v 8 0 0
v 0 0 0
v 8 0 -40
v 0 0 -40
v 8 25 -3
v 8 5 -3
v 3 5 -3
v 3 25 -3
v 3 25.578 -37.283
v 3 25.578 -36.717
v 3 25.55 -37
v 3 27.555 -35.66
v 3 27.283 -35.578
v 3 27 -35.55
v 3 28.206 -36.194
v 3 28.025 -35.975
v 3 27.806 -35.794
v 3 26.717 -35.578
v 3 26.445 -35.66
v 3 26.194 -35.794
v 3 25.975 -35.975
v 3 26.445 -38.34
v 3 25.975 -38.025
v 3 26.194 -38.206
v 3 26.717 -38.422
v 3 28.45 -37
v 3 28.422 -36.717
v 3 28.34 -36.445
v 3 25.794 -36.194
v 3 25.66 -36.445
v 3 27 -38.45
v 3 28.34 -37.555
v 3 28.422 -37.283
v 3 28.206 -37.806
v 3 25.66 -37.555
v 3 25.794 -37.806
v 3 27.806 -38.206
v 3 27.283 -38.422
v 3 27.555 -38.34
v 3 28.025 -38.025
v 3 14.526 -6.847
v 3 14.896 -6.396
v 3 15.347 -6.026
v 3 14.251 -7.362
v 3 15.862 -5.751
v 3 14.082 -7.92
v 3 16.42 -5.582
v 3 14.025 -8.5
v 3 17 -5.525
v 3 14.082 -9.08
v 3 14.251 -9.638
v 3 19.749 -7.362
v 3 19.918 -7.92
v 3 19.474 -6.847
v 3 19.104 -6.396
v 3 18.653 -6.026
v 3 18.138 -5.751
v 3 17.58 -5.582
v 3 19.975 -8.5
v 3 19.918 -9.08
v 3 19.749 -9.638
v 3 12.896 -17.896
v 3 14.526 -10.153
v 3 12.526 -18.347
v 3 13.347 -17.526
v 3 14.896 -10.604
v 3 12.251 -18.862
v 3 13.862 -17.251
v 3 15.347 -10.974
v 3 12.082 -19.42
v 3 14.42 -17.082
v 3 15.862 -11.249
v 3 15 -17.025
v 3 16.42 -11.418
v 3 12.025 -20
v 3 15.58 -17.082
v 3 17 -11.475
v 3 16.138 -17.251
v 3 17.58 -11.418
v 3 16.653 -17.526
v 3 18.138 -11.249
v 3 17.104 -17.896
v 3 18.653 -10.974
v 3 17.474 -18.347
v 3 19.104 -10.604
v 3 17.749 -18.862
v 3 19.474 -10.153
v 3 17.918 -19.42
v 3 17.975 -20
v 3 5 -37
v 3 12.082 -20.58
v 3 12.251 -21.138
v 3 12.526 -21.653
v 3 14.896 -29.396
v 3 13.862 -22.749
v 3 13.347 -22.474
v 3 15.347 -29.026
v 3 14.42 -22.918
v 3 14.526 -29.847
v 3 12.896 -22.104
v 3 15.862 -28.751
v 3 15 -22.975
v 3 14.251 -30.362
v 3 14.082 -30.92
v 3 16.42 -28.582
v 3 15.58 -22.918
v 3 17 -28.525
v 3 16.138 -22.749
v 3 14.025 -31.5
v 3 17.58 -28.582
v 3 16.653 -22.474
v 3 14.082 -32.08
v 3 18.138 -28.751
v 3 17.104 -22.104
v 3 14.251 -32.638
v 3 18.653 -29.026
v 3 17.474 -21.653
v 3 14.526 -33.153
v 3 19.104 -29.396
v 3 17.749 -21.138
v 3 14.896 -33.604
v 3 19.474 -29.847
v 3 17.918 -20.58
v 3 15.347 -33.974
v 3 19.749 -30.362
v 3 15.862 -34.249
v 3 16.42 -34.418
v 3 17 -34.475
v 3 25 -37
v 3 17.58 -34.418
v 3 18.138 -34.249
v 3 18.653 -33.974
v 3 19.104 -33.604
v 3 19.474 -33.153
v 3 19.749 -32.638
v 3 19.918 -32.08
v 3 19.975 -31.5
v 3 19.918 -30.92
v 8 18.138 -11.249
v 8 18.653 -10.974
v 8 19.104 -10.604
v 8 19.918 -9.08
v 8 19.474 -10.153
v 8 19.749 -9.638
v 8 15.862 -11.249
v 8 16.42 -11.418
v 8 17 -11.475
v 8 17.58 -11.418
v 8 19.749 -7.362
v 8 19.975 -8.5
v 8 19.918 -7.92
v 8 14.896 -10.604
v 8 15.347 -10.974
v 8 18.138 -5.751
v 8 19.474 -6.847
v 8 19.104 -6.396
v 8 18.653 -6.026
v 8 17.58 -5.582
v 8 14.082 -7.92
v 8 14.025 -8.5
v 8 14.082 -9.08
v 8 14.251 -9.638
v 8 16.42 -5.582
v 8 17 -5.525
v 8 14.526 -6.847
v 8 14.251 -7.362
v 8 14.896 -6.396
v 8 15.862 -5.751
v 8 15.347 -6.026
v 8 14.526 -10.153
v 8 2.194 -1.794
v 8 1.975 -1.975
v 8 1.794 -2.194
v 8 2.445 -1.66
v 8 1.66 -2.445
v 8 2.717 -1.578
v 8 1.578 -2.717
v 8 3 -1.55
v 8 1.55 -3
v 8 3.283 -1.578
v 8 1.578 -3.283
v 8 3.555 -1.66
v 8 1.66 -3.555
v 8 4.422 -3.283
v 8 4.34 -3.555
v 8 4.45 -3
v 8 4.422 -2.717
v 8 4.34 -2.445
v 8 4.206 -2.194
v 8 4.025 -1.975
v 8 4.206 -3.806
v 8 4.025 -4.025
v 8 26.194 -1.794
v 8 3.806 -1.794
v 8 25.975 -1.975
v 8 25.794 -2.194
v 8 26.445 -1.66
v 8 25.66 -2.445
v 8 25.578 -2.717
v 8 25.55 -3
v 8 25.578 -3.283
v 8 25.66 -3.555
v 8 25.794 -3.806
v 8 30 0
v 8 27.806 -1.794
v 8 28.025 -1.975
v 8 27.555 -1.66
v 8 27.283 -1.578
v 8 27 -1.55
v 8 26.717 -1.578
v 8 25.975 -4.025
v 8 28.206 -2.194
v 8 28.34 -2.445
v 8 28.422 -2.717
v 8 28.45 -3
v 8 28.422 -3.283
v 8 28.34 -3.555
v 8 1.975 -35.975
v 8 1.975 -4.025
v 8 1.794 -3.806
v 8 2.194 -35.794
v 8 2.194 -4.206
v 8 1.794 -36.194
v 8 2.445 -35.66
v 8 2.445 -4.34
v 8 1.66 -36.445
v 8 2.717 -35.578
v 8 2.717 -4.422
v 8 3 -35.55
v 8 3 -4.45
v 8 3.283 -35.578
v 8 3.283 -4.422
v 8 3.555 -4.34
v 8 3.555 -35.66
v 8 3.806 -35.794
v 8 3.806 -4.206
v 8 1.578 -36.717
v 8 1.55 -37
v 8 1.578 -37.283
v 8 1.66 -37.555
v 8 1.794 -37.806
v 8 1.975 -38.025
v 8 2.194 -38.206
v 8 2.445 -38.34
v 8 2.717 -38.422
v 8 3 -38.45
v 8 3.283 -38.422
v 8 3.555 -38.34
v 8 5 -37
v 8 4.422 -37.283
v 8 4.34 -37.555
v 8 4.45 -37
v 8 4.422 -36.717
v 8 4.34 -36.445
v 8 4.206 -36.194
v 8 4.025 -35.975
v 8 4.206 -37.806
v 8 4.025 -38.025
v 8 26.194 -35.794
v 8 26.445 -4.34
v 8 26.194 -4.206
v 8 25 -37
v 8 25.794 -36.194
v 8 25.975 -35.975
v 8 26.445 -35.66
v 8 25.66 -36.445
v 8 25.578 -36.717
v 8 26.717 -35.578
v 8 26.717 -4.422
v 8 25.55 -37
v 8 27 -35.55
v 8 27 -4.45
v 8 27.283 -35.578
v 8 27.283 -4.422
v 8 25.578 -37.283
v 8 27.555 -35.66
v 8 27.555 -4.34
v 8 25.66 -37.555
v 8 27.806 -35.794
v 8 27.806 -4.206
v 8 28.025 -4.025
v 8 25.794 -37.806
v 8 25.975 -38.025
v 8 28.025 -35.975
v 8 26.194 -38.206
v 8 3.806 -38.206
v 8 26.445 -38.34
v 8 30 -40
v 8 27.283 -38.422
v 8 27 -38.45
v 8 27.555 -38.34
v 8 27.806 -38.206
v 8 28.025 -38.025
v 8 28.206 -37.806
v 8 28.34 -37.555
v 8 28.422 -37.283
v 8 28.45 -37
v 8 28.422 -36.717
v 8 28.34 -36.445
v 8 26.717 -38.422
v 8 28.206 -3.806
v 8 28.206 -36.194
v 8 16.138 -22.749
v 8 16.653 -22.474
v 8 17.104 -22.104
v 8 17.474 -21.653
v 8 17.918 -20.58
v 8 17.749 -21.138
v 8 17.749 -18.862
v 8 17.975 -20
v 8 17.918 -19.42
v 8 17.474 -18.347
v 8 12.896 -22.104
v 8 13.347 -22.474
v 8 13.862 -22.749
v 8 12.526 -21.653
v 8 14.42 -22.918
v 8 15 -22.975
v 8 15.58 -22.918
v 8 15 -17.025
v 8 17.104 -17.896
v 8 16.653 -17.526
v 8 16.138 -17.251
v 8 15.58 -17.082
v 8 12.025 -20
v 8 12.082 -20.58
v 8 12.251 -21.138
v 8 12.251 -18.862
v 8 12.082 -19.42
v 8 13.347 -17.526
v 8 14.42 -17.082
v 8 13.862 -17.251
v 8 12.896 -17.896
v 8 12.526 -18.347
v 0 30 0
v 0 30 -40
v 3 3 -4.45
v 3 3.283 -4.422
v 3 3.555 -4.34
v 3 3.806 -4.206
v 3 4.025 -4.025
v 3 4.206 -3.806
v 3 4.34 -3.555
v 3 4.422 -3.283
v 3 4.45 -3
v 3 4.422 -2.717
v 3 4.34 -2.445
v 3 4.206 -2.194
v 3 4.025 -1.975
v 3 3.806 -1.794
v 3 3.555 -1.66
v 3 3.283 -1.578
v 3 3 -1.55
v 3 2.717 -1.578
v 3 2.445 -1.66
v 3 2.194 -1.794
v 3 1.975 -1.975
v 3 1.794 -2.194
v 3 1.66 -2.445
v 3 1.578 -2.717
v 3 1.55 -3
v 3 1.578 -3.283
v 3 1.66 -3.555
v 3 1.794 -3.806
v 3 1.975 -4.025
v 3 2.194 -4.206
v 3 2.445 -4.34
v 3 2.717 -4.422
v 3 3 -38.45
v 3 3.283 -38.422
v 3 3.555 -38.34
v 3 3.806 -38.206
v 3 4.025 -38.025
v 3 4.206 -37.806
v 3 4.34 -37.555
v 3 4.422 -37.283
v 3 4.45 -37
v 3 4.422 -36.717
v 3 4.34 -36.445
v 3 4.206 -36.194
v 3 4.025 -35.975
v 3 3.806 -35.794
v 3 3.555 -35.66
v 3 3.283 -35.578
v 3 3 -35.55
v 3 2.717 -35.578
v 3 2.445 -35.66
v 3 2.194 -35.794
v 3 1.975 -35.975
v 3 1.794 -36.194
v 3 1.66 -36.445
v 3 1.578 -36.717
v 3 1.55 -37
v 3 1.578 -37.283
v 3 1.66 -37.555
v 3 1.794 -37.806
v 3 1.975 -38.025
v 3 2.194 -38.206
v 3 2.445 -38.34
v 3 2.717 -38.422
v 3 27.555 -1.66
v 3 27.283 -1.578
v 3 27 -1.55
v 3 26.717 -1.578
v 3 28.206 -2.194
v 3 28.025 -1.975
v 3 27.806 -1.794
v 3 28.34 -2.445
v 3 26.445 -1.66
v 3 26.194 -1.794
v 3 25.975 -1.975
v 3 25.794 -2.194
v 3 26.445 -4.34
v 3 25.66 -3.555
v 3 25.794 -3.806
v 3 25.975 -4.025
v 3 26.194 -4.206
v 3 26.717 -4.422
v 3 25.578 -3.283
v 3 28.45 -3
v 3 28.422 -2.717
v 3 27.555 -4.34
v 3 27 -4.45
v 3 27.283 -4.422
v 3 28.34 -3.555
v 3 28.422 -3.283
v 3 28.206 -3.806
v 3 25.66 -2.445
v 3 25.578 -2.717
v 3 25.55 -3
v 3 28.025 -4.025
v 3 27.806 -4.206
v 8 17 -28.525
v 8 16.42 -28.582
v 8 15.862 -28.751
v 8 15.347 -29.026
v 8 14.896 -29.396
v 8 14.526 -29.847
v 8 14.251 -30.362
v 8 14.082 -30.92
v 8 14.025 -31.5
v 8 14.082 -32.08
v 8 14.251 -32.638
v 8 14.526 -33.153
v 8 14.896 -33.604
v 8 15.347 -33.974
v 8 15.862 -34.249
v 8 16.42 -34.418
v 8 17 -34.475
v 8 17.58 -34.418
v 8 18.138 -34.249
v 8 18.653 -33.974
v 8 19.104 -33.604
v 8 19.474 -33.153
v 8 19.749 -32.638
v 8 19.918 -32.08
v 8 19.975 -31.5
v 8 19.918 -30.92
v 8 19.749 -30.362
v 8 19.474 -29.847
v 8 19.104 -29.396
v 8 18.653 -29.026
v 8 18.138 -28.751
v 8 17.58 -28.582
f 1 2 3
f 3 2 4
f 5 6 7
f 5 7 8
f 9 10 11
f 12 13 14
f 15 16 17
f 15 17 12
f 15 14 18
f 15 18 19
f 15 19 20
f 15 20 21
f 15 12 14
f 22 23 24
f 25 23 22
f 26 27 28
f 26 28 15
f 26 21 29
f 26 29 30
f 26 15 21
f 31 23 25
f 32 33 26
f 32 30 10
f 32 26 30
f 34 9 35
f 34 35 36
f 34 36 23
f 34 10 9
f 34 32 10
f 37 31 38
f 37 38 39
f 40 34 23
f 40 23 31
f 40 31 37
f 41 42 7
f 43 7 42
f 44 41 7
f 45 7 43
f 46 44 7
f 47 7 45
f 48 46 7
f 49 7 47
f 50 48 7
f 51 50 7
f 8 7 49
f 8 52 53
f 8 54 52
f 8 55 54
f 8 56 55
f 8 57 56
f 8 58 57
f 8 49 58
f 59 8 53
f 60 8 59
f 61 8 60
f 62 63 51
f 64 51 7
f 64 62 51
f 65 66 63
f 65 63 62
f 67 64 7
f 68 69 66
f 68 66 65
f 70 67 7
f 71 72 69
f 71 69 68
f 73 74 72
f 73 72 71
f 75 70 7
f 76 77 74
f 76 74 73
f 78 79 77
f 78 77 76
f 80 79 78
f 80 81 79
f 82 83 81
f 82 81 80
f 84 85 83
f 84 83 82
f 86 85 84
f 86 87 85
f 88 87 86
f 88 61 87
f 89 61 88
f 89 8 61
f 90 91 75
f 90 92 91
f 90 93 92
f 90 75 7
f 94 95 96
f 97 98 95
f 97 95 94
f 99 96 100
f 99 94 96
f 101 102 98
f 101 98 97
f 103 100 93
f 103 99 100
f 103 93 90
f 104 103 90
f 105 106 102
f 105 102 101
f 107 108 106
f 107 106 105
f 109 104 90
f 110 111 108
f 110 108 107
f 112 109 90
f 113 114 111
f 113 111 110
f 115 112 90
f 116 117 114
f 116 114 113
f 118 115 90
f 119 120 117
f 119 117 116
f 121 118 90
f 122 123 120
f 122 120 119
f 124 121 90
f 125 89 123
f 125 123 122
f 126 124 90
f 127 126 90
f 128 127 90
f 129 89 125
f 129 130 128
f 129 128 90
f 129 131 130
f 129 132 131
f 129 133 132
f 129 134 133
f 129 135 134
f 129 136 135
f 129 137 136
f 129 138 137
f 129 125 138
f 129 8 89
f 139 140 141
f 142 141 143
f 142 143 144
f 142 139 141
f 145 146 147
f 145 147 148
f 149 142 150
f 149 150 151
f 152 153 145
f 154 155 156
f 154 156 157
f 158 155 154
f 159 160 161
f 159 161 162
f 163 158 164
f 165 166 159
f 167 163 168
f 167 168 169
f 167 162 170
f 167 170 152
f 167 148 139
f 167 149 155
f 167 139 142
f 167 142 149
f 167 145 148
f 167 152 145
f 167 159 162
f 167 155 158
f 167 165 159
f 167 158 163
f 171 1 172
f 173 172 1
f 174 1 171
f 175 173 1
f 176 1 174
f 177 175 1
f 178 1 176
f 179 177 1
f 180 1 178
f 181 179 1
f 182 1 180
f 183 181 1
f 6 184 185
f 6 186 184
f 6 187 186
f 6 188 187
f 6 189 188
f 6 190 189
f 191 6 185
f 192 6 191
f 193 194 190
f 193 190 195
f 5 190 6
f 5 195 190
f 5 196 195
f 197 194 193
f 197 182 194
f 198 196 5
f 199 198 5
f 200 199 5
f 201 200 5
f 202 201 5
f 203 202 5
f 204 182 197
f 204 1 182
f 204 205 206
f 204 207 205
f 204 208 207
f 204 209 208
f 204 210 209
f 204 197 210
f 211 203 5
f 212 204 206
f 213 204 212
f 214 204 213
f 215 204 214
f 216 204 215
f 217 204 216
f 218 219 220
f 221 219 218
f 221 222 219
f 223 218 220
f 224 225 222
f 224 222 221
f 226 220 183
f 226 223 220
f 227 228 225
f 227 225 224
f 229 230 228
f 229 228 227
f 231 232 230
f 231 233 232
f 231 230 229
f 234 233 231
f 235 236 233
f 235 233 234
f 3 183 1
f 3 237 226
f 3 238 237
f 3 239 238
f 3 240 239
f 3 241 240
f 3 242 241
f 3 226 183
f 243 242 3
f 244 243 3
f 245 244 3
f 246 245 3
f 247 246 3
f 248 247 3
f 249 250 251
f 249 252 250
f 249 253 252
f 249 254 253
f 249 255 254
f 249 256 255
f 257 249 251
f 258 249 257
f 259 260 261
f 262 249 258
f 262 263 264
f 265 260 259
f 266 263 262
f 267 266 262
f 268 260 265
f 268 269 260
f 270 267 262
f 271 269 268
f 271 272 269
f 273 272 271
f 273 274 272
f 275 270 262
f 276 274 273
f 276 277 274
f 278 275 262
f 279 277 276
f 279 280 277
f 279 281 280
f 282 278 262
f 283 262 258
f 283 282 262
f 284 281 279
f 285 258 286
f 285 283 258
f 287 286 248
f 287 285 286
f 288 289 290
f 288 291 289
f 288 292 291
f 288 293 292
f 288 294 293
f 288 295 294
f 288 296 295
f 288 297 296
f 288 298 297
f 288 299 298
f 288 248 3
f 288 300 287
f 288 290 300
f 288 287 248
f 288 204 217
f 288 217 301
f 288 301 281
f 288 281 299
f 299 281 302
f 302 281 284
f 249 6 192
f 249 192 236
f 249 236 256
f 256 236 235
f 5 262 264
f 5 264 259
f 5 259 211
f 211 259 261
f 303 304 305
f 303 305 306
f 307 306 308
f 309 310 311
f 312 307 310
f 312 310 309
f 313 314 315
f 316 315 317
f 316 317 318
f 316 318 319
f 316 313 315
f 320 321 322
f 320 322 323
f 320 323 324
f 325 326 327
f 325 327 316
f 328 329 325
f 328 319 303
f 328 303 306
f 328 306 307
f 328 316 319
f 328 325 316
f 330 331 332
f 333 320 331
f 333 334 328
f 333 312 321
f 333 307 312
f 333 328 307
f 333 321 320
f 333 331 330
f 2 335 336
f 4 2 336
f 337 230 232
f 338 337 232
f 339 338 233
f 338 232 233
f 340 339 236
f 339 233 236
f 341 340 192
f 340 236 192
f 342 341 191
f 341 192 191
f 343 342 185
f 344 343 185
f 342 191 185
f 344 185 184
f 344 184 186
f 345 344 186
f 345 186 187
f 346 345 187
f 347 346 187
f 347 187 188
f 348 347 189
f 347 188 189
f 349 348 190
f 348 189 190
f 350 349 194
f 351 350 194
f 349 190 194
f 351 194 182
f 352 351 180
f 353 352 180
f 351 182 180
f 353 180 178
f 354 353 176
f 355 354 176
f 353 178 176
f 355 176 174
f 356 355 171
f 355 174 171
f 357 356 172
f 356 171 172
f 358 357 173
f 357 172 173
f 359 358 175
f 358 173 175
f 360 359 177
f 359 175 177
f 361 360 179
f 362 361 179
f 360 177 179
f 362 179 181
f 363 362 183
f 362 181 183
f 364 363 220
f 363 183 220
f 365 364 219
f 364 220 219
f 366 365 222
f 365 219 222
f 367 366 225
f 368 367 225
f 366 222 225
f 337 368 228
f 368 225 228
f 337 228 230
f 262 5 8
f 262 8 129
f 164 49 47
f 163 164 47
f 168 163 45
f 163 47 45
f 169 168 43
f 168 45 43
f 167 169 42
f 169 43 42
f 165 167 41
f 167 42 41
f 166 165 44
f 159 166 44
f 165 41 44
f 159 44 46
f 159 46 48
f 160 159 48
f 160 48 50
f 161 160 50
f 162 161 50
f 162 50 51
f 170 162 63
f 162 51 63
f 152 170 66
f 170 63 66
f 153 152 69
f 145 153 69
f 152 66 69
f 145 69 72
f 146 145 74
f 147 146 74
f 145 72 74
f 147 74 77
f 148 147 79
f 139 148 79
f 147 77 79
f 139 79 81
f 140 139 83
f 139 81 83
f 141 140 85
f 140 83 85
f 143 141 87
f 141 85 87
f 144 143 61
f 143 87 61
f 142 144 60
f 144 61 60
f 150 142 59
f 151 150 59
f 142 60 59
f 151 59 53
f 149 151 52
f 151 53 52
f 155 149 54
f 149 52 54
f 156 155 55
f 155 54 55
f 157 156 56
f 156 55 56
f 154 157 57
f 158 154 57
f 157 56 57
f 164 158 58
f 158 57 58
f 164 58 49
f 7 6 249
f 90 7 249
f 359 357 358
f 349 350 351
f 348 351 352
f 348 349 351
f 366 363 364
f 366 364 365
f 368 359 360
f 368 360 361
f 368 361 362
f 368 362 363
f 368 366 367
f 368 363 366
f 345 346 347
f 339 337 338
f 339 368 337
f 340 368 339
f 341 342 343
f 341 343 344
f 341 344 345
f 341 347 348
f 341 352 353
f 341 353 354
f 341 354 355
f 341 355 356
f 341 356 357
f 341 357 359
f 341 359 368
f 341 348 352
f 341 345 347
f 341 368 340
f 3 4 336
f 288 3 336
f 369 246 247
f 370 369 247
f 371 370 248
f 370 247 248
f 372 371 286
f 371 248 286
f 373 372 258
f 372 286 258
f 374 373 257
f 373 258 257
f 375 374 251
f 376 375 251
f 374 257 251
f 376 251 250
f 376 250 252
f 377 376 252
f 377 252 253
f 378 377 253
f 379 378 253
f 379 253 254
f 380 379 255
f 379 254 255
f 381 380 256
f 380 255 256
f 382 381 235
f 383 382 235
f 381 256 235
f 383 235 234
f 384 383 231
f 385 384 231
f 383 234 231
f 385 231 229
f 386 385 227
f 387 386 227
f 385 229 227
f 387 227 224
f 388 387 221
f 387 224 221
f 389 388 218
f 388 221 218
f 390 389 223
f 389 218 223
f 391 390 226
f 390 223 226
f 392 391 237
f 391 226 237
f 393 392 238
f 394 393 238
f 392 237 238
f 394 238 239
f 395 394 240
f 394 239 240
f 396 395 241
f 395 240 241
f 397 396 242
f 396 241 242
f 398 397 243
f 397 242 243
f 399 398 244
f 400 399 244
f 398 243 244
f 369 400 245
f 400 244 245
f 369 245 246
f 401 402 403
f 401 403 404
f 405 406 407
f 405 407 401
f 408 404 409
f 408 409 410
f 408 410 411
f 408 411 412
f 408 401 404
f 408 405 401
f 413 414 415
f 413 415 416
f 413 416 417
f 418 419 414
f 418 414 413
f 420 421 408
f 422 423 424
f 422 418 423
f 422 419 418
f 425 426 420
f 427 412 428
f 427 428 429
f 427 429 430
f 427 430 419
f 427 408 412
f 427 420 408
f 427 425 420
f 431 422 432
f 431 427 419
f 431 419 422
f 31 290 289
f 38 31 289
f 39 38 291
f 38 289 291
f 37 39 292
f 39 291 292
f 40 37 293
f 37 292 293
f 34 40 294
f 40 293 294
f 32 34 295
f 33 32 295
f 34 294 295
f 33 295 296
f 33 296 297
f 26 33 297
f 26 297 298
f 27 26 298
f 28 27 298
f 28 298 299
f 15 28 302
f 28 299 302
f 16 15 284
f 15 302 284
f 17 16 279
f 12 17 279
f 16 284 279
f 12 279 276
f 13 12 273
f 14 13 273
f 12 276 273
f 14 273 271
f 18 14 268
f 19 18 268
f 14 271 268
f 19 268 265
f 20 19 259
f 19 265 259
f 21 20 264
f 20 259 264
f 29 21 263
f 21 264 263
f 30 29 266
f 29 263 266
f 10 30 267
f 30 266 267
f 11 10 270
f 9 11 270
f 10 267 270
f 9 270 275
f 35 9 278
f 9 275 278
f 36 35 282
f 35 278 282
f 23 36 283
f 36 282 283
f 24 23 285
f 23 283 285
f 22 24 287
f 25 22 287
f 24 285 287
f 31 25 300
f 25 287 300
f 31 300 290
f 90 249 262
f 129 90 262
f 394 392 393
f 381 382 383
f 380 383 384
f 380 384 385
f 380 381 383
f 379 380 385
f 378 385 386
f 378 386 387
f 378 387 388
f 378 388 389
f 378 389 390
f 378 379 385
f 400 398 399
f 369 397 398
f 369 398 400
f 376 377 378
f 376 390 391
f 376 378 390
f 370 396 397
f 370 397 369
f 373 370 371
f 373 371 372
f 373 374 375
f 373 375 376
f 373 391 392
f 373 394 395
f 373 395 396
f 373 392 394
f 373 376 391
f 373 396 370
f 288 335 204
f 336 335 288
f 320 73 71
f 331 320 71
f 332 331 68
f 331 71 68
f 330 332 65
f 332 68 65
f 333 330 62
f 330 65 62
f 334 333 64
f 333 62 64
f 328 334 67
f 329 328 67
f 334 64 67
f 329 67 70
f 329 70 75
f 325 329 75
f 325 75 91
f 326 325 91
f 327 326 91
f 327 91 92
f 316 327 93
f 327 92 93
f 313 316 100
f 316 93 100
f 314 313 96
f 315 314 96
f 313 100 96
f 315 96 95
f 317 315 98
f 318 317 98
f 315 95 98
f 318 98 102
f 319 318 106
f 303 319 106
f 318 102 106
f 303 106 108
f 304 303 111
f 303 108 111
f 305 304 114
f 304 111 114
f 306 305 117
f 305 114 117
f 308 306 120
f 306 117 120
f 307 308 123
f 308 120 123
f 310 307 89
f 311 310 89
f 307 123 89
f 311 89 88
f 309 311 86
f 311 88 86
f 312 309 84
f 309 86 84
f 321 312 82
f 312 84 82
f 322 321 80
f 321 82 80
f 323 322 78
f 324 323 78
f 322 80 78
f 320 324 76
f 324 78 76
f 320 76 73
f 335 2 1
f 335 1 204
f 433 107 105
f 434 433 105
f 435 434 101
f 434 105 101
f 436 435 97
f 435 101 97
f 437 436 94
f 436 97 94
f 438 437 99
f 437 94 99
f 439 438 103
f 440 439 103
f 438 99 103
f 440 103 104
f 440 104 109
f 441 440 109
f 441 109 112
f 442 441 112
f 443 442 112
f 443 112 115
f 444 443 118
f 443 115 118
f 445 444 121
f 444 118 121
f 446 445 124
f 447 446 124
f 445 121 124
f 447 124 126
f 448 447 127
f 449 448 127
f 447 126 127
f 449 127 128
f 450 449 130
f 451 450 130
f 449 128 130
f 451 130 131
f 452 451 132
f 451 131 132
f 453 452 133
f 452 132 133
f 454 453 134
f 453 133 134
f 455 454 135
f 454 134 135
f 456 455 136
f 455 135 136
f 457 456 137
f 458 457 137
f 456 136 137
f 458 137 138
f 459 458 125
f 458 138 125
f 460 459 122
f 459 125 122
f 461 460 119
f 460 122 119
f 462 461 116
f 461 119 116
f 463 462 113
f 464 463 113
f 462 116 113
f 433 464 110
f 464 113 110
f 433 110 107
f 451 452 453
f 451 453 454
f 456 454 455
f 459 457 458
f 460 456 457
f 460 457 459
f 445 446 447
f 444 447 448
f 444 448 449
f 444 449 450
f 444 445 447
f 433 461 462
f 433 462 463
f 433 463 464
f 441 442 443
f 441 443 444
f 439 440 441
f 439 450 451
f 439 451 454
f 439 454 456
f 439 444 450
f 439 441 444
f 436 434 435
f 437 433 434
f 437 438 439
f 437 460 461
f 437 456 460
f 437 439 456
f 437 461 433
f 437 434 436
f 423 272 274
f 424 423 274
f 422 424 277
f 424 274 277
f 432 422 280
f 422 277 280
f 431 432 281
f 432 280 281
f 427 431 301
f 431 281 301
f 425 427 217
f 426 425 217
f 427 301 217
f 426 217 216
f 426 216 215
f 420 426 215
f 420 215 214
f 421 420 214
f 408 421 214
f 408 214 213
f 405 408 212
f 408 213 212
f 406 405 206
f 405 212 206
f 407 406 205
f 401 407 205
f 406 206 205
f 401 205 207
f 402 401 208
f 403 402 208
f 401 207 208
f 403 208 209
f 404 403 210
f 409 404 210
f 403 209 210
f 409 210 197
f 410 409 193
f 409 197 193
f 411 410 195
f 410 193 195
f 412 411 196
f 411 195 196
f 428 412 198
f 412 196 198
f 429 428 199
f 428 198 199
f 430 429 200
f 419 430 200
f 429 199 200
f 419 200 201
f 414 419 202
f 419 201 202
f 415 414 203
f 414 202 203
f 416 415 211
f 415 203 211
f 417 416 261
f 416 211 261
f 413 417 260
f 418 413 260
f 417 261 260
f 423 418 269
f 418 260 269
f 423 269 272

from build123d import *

# Parameters (mm, degrees)
SKETCH1_W           = 40
SKETCH1_H           = 30
BOSS_EXTRUDE1_DEPTH = 8
SKETCH4_R           = 1.45
SKETCH4_W           = 34
SKETCH4_H           = 20
CUT_EXTRUDE1_DEPTH  = 5
SKETCH5_R           = 2.975
BOSS_EXTRUDE2_DEPTH = 5


with BuildPart() as part:
    # Sketch1 → Boss-Extrude1 (new body)
    with BuildSketch(Plane(origin=(0, 0, 0), x_dir=(0, 0, -1), z_dir=(1, 0, 0))):
        with Locations((20, 15)):
            Rectangle(SKETCH1_W, SKETCH1_H)
    extrude(amount=BOSS_EXTRUDE1_DEPTH)

    # Sketch4 → Cut-Extrude1 (cut)
    with BuildSketch(Plane(origin=(8, 0, 0), x_dir=(0, 0, -1), z_dir=(1, 0, 0))):
        with Locations((37, 27)):
            Circle(SKETCH4_R)
        with Locations((3, 27)):
            Circle(SKETCH4_R)
        with Locations((3, 3)):
            Circle(SKETCH4_R)
        with Locations((37, 3)):
            Circle(SKETCH4_R)
        with Locations((20, 15)):
            Rectangle(SKETCH4_W, SKETCH4_H)
    extrude(amount=-CUT_EXTRUDE1_DEPTH, mode=Mode.SUBTRACT)

    # Sketch5 → Boss-Extrude2 (add)
    with BuildSketch(Plane(origin=(3, 0, 0), x_dir=(0, 0, -1), z_dir=(1, 0, 0))):
        with Locations(Location((8.5, 17, 0), (0, 0, 180))):
            Circle(SKETCH5_R)
        with Locations(Location((20, 15, 0), (0, 0, 180))):
            Circle(SKETCH5_R)
        with Locations(Location((31.5, 17, 0), (0, 0, 180))):
            Circle(SKETCH5_R)
    extrude(amount=BOSS_EXTRUDE2_DEPTH)


solid = part.part
